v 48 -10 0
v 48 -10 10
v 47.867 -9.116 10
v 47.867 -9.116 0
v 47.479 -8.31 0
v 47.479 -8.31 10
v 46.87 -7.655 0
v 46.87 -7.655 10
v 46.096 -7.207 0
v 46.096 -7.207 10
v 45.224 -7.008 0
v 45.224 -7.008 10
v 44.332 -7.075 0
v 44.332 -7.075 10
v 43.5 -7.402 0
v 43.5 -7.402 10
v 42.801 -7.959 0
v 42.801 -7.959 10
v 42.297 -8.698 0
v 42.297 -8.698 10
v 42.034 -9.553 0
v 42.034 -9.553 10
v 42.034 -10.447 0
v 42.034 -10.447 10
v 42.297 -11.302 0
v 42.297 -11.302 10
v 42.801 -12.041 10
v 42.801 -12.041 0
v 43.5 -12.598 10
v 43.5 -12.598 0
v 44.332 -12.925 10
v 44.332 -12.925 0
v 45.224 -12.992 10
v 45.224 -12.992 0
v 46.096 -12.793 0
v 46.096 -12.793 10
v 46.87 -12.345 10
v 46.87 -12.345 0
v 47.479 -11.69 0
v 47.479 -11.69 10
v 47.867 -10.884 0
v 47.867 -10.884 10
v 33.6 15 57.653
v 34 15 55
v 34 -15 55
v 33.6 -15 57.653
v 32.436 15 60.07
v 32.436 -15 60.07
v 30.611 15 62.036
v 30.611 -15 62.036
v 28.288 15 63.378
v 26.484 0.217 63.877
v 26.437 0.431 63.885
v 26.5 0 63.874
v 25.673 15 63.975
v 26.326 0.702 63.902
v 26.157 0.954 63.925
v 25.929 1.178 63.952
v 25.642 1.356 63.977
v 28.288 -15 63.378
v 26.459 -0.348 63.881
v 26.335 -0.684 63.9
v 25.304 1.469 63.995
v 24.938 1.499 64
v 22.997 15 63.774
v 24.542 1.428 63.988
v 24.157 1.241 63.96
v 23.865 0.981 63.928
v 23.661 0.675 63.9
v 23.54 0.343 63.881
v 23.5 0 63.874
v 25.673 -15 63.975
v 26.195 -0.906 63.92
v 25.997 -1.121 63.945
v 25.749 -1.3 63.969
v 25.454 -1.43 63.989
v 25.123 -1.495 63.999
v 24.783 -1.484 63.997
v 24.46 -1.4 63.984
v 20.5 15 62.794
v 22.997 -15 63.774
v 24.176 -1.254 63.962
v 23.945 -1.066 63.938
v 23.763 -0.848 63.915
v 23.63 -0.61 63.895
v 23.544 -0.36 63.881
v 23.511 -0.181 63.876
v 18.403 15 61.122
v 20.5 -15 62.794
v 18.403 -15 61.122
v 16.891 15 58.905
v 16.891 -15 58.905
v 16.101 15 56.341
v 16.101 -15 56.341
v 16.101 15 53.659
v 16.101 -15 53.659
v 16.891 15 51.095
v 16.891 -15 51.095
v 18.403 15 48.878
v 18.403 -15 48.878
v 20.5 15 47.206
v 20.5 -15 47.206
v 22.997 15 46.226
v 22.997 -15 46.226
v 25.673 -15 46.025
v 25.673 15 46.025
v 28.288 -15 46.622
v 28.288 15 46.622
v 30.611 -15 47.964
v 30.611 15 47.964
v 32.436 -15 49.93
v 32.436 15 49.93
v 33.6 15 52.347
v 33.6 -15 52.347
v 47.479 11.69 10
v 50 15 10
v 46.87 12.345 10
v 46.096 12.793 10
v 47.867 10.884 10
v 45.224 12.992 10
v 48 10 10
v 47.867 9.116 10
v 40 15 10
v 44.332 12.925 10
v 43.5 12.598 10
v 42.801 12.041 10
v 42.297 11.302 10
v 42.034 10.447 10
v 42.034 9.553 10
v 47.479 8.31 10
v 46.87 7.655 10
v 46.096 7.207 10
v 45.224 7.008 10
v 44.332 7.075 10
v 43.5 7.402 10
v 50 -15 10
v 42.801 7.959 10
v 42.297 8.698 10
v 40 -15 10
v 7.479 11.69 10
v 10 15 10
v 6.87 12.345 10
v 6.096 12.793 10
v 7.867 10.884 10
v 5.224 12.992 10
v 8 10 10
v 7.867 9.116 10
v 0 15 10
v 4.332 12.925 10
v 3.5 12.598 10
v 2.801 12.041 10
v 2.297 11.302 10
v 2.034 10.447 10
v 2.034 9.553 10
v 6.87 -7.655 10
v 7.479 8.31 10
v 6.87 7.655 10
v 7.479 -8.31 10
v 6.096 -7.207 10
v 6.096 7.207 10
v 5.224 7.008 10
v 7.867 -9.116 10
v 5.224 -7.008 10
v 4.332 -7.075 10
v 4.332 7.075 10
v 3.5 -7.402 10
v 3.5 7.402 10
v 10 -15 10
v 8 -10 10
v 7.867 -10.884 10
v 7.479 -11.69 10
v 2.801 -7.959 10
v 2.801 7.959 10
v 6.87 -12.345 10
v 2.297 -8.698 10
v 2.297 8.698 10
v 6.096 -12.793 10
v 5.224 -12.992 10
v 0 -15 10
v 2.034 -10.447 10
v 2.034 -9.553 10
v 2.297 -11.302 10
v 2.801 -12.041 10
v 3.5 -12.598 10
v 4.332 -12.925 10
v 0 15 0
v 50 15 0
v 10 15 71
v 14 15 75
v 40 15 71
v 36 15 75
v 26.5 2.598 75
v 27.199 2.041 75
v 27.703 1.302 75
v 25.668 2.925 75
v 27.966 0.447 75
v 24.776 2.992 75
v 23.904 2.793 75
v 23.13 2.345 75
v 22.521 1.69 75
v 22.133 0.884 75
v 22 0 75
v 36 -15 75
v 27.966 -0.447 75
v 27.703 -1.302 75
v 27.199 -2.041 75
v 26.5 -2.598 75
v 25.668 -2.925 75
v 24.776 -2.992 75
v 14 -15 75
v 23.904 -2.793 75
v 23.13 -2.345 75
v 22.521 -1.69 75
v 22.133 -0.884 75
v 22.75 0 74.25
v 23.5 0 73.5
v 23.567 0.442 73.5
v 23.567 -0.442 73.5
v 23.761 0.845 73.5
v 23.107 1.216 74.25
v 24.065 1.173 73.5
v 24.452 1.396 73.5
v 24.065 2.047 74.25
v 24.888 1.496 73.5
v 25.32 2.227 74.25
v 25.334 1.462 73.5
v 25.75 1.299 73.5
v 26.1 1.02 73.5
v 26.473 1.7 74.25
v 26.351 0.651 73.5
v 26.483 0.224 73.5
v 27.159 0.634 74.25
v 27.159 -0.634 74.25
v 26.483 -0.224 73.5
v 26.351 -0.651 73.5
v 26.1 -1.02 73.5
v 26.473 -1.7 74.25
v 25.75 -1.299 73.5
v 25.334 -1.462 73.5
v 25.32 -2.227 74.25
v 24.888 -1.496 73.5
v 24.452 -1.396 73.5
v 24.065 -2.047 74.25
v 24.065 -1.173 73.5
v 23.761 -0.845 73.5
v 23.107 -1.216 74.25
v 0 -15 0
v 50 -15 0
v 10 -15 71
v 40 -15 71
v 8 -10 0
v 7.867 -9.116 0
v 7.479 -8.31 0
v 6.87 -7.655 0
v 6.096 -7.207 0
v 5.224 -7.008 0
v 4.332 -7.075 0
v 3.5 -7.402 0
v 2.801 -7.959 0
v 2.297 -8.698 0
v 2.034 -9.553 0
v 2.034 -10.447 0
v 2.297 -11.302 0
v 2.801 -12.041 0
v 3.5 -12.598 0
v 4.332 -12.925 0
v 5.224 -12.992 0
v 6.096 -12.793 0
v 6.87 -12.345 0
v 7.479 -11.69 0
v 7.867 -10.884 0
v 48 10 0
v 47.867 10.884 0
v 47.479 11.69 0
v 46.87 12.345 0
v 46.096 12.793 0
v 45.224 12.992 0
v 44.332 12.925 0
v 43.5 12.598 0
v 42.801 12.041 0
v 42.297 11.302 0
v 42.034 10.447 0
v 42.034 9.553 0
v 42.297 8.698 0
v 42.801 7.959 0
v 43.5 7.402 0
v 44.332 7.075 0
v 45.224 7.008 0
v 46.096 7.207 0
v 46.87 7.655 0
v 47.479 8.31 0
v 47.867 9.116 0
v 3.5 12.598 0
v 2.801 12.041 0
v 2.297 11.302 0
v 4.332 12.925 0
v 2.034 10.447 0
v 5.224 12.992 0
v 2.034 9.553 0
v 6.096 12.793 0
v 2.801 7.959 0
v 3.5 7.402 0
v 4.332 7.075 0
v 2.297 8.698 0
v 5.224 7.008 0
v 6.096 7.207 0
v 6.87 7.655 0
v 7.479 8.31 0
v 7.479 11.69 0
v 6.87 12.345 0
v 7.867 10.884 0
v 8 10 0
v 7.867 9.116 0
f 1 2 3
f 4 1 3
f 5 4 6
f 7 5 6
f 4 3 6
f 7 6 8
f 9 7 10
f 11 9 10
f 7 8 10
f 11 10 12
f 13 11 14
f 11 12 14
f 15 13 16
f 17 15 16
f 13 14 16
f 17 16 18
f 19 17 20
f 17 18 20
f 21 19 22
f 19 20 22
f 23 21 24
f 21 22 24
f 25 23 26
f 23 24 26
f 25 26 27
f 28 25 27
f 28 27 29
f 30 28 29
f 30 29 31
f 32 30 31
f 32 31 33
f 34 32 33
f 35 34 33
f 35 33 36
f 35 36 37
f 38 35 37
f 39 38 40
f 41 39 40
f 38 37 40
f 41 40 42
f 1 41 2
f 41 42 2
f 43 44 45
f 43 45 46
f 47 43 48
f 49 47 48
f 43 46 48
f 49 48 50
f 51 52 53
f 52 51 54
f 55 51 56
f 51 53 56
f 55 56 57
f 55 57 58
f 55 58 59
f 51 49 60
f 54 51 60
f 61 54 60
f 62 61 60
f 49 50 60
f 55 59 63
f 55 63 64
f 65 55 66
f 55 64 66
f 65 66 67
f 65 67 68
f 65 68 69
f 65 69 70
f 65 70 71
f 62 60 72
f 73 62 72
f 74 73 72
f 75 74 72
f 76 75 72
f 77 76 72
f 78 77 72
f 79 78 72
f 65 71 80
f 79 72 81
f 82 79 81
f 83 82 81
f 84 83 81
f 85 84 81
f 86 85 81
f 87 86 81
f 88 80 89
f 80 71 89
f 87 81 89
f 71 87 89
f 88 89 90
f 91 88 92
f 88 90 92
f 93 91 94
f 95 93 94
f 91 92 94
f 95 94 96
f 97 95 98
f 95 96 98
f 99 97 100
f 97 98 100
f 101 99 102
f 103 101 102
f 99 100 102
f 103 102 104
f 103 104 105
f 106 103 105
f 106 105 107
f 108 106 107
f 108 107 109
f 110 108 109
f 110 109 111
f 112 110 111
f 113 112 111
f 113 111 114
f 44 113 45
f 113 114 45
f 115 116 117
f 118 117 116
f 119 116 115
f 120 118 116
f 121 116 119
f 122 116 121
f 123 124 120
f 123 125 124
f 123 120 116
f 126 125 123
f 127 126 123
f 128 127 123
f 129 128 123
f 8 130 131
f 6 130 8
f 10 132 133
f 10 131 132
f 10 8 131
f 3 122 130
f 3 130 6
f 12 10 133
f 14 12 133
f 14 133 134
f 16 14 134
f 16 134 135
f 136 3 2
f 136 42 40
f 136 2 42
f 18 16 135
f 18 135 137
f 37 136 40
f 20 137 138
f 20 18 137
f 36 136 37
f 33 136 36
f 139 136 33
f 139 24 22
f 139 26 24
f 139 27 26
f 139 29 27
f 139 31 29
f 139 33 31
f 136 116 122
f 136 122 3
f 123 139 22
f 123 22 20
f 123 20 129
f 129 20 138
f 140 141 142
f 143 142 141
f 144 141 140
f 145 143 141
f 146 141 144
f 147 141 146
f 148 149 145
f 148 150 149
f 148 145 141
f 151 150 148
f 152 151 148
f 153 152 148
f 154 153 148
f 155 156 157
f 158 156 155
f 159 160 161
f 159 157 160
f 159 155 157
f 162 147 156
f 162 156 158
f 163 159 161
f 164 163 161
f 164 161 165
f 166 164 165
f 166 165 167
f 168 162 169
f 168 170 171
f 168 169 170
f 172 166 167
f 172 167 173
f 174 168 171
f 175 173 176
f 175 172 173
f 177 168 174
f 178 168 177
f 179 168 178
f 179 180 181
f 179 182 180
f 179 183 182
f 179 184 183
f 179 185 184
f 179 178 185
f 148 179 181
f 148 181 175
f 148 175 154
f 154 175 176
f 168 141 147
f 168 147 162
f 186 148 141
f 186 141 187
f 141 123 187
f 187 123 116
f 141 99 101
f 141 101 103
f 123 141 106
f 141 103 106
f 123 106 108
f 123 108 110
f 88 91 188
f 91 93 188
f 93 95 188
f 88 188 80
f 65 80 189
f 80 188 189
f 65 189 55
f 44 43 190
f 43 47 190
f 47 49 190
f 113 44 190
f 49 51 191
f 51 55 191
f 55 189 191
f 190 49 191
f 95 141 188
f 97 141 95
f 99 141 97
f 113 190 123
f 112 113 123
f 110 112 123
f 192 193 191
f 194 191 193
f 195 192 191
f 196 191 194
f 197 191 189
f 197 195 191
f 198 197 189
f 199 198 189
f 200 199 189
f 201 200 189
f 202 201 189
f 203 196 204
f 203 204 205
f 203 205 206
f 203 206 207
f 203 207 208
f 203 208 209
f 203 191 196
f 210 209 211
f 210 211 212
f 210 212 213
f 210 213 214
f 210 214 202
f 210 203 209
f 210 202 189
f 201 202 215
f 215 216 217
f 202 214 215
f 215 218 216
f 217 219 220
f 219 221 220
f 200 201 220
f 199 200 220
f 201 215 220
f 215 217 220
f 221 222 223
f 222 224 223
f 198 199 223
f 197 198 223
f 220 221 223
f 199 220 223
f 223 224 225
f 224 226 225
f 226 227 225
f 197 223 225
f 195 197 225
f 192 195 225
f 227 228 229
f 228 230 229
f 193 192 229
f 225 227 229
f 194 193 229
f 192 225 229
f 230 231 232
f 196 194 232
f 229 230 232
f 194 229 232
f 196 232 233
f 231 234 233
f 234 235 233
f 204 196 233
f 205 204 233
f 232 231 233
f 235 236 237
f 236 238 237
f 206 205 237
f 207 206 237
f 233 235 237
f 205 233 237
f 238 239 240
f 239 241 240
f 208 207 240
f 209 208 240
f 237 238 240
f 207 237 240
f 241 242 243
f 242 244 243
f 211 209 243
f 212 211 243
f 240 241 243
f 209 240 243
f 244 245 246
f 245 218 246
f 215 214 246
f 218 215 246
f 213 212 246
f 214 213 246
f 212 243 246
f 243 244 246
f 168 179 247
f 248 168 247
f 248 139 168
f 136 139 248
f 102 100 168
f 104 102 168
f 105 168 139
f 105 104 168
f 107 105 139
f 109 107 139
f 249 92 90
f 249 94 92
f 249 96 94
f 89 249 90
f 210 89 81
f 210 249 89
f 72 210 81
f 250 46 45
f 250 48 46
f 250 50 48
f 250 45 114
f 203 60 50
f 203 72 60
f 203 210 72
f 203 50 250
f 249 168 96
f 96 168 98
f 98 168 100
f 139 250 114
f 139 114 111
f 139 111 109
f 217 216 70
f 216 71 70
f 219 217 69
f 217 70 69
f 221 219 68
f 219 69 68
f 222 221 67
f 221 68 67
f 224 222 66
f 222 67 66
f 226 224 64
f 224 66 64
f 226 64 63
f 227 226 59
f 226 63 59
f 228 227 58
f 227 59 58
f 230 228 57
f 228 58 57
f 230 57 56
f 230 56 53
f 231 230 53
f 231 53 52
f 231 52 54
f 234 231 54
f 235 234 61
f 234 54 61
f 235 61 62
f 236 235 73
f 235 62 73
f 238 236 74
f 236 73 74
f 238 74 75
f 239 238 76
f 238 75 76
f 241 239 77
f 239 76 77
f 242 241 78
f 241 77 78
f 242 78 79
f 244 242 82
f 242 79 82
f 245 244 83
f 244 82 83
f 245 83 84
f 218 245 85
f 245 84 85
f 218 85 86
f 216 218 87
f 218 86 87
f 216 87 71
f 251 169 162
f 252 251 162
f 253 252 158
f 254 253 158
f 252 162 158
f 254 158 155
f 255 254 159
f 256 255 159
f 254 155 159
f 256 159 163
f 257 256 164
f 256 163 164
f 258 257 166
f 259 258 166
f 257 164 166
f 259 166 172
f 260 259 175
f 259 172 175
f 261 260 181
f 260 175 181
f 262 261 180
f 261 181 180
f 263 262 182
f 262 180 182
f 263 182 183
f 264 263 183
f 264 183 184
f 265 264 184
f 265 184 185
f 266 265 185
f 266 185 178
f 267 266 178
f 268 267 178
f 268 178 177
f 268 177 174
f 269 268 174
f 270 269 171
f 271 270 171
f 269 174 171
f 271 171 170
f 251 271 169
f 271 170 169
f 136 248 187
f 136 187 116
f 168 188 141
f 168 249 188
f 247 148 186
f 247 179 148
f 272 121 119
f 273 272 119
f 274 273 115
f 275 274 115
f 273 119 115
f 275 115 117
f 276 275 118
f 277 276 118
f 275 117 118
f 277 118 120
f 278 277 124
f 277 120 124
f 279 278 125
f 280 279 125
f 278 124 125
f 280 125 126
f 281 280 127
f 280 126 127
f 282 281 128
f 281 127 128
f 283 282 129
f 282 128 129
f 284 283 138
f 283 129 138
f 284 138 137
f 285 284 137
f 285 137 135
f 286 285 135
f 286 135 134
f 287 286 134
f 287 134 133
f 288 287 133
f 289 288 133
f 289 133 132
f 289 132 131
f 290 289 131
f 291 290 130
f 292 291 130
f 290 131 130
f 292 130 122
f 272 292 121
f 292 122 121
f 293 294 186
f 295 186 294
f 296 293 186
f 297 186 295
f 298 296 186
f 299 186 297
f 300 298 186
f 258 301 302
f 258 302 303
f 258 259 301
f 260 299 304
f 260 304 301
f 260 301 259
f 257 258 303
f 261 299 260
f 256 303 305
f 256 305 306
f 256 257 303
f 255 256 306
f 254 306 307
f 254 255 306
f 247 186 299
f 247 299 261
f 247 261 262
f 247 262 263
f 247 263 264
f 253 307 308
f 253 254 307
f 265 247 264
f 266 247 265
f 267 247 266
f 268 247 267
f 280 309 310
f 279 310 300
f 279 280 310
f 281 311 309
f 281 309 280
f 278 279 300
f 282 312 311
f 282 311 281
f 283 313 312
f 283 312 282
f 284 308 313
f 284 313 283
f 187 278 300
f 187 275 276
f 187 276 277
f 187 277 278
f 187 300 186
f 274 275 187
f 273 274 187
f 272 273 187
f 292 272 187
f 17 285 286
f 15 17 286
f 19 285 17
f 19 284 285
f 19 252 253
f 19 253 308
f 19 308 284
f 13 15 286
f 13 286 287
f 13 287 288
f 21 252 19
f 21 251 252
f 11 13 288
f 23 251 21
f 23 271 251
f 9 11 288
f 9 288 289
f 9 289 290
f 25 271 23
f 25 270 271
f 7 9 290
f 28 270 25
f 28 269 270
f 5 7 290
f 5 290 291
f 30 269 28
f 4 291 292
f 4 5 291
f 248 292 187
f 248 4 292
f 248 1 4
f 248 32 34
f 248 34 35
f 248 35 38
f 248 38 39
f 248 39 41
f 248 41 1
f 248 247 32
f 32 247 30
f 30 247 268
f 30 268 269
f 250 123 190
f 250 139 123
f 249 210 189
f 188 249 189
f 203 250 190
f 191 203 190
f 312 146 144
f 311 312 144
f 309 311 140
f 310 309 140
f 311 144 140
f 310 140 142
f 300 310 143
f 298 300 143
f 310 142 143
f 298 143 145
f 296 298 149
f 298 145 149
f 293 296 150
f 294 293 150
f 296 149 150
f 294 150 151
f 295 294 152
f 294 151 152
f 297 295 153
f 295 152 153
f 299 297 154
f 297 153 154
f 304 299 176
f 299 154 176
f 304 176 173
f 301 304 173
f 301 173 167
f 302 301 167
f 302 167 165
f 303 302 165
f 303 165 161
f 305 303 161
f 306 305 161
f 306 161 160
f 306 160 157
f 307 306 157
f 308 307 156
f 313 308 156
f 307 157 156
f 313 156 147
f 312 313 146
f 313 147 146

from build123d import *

# Parameters (mm, degrees)
F0_R           = 9
F1_DEPTH       = 15
F1_DEPTH_BACK  = 15
F3_D           = 3
F3_DEPTH       = 20
F3_CSINK_D     = 6
F3_CSINK_ANGLE = 90
F4_R           = 3
F5_DEPTH       = 10
F6_SIZE        = 4


with BuildPart() as f1:
    # F0 (on Front) → F1 (new body, two sides)
    with BuildSketch(Plane.XZ) as f1_sk:
        Polygon((0, 10), (0, 0), (50, 0), (50, 10), (40, 10), (40, 75), (10, 75), (10, 10), align=None)
        with Locations((25, 55)):
            Circle(F0_R, mode=Mode.SUBTRACT)
    extrude(amount=F1_DEPTH)
    extrude(f1_sk.sketch, amount=-F1_DEPTH_BACK)

    # F3
    with Locations(Plane.XY.offset(75)):
        with Locations((25, 0)):
            CounterSinkHole(F3_D / 2, F3_CSINK_D / 2, depth=F3_DEPTH, counter_sink_angle=F3_CSINK_ANGLE)

    # F4 (on face) → F5 (cut)
    with BuildSketch(Plane.XY.offset(10)):
        with Locations((5, 10)):
            Circle(F4_R)
        with Locations((5, -10)):
            Circle(F4_R)
        with Locations((45, -10)):
            Circle(F4_R)
        with Locations((45, 10)):
            Circle(F4_R)
    extrude(amount=-F5_DEPTH, mode=Mode.SUBTRACT)

    # F6
    f6_edges = [f1.edges().sort_by_distance(p)[0] for p in [
        (40, 0, 75),
        (10, 0, 75),
    ]]
    chamfer(f6_edges, length=F6_SIZE)


solid = f1.part
